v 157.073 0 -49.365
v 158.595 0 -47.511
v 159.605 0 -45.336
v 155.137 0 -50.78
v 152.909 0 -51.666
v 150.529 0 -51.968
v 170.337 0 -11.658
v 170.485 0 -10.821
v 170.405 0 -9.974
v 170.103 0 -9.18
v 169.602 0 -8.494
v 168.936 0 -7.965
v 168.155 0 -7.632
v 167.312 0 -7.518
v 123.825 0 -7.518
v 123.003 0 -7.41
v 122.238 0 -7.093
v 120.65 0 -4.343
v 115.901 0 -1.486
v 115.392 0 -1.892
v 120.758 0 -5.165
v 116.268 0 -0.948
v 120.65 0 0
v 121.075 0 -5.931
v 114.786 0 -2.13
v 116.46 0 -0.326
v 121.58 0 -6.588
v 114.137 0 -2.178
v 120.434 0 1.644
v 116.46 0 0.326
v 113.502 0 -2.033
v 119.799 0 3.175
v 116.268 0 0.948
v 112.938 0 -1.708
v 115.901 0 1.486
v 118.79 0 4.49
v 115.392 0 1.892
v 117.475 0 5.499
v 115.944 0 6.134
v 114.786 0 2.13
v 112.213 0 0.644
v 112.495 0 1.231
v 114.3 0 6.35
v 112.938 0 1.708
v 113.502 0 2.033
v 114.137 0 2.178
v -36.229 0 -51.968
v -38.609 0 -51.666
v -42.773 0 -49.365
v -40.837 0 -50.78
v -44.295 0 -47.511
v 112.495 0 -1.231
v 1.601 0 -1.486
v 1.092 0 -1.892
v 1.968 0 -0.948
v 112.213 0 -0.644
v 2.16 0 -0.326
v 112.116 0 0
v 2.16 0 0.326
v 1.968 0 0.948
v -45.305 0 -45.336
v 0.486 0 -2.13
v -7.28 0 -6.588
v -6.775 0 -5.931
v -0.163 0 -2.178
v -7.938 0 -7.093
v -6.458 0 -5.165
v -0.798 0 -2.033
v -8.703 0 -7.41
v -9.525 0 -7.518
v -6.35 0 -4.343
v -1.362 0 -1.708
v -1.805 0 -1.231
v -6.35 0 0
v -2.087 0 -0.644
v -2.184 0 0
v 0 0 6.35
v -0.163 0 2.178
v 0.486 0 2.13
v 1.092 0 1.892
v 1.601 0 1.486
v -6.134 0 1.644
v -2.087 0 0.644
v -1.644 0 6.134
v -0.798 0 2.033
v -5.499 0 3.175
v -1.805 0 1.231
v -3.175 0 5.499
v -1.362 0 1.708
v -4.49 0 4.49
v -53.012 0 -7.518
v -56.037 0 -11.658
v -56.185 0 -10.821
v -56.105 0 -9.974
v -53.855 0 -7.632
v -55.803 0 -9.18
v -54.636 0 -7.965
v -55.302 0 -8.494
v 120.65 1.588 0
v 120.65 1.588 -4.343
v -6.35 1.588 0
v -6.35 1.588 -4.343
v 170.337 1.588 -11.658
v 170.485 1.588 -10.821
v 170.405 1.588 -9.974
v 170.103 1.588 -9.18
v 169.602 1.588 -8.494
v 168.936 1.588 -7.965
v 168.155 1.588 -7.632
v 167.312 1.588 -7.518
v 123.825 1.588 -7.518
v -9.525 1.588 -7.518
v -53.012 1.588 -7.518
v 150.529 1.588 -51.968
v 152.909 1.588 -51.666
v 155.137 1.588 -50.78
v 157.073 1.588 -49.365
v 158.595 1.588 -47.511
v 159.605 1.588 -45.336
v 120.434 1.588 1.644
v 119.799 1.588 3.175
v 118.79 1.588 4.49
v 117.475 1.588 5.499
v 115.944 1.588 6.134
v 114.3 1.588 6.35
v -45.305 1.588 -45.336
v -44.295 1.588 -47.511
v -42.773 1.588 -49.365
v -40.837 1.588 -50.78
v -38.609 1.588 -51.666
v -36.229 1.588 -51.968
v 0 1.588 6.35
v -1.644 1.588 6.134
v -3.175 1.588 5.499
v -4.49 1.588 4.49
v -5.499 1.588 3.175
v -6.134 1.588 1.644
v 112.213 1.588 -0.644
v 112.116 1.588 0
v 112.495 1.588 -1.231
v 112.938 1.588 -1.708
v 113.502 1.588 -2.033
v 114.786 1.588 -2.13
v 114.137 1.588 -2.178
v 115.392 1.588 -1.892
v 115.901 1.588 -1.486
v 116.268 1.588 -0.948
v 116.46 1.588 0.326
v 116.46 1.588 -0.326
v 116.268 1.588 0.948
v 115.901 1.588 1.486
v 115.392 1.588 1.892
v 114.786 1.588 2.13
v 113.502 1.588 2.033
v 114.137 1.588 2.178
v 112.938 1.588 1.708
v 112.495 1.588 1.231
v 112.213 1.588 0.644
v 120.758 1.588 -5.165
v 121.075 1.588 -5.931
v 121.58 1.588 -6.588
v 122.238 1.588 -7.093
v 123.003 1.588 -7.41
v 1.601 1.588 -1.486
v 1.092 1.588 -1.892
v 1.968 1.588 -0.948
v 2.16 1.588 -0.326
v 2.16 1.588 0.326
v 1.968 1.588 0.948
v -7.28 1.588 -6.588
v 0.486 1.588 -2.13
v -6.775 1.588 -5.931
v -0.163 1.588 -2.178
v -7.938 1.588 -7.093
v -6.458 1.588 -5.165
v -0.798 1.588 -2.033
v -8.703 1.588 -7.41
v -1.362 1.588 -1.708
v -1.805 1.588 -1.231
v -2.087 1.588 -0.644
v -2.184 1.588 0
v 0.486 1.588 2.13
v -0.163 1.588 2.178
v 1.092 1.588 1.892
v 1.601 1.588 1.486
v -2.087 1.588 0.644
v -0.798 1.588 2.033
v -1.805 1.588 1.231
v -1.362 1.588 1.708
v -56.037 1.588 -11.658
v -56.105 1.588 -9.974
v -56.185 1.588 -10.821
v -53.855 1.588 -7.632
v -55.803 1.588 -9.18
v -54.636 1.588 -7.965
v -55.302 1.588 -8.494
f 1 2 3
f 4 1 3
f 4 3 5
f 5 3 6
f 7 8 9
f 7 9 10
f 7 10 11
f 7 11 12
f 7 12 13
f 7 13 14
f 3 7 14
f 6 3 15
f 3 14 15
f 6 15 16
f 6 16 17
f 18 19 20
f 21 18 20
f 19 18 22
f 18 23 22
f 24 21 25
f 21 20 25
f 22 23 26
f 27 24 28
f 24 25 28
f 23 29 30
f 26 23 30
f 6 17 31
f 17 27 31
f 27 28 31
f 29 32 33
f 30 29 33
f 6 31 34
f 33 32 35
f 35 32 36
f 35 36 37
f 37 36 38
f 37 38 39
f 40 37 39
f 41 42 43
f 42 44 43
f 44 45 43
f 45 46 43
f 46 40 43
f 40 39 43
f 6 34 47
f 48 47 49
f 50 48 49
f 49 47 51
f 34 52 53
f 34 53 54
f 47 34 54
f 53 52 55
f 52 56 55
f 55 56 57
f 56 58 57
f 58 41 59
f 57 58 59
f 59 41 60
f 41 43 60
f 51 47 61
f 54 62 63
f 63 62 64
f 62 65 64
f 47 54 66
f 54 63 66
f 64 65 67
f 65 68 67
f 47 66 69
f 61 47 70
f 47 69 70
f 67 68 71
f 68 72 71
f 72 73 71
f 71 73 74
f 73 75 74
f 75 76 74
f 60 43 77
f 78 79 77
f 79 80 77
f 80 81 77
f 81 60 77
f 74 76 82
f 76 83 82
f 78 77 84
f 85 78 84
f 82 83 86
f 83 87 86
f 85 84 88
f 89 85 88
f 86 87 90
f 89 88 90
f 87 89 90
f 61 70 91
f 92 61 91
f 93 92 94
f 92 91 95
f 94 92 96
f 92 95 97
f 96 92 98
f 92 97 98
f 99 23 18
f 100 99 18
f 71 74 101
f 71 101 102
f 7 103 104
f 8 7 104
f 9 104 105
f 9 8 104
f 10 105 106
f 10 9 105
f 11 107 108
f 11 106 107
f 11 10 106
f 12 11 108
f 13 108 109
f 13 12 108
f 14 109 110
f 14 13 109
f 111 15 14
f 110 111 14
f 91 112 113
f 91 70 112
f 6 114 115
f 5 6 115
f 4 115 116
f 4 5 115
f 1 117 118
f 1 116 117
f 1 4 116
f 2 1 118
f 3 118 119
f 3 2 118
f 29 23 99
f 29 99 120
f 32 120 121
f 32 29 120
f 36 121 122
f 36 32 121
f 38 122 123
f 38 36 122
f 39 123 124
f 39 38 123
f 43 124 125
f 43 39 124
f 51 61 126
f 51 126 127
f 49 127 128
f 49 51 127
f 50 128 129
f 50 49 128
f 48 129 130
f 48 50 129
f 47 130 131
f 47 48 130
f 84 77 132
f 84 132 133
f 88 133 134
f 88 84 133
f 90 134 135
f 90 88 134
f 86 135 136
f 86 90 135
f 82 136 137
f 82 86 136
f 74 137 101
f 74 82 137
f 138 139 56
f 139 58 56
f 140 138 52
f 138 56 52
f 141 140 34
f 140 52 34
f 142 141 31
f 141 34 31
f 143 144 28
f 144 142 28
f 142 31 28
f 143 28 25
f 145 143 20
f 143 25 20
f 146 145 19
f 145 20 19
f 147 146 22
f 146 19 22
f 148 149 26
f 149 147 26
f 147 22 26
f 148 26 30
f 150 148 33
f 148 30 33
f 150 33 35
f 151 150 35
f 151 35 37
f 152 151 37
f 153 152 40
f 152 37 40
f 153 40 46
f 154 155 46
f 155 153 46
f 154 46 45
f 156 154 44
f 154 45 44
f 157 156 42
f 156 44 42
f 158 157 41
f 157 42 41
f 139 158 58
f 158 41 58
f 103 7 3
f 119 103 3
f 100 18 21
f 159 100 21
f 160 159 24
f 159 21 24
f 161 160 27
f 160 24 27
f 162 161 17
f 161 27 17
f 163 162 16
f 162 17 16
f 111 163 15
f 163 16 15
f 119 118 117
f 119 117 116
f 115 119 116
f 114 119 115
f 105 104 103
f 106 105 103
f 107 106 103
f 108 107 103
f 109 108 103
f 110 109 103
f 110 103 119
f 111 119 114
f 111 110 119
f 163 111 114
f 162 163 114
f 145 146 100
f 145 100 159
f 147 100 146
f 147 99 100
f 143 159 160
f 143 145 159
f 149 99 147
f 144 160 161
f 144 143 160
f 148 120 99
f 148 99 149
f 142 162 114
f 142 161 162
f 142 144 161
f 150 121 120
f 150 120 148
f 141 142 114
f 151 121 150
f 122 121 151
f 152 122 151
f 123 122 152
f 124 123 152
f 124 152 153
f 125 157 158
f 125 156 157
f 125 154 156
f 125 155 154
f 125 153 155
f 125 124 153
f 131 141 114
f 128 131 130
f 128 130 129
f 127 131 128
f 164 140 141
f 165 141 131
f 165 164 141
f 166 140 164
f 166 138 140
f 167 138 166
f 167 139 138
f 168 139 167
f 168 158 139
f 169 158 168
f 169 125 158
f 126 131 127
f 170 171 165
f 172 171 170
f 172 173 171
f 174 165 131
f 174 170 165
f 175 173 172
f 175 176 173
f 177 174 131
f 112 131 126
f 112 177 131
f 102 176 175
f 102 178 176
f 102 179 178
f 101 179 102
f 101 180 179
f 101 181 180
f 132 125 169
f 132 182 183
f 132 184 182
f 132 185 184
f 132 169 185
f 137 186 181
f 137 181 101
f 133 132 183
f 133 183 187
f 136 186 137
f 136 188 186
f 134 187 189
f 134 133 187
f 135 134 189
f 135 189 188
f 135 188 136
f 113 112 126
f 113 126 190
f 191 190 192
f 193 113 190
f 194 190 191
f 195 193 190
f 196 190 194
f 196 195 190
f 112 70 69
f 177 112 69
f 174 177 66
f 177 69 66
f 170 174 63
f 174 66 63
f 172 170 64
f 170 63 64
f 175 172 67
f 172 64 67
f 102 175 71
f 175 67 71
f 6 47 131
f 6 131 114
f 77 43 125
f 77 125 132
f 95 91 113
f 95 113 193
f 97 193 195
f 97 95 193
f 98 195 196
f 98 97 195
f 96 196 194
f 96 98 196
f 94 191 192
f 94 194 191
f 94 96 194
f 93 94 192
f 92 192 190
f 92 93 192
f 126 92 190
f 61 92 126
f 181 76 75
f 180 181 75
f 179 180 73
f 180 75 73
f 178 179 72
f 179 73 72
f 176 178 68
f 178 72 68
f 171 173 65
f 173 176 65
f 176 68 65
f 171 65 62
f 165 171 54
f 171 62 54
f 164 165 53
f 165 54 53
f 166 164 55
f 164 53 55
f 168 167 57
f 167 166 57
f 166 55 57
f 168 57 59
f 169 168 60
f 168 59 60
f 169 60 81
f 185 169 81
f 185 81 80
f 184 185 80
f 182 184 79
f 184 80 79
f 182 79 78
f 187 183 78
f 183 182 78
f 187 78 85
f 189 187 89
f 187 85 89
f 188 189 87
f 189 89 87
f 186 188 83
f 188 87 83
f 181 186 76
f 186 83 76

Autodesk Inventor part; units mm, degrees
ref_plane "YZ Plane" through (0, 0, 0) normal (1, 0, 0) x (0, 1, 0)
ref_plane "XZ Plane" through (0, 0, 0) normal (0, 1, 0) x (-1, 0, 0)
ref_plane "XY Plane" through (0, 0, 0) normal (0, 0, 1) x (1, 0, 0)
sketch "main" plane through (0, 0, 0) normal (0, 0, 1) x (1, 0, 0)
  line L0 (-49.2738, 43.4655) -> (65.0262, 43.4655)
  circle A0 centre (65.0262, 37.1155) radius 2.1844
  line L1 (71.3762, 37.1155) -> (71.3762, 32.7721)
  arc A1 (71.3762, 37.1155) -> (65.0262, 43.4655) centre (65.0262, 37.1155) ccw
  line L2 (-71.4988, 29.5971) -> (-102.2861, 29.5971)
  line L3 (-105.3112, 25.4581) -> (-94.5785, -8.22)
  line L4 (-58.7988, 29.5971) -> (118.0384, 29.5971)
  line L5 (121.0635, 25.4581) -> (110.3309, -8.22)
  line L6 (101.2556, -14.8529) -> (-85.5032, -14.8529)
  arc A2 (-94.5785, -8.22) -> (-85.5032, -14.8529) centre (-85.5032, -5.3279) ccw
  arc A3 (101.2556, -14.8529) -> (110.3309, -8.22) centre (101.2556, -5.3279) ccw
  arc A4 (-102.2861, 29.5971) -> (-105.3112, 25.4581) centre (-102.2861, 26.4221) ccw
  arc A5 (121.0635, 25.4581) -> (118.0384, 29.5971) centre (118.0384, 26.4221) ccw
  arc A6 (71.3762, 32.7721) -> (74.5512, 29.5971) centre (74.5512, 32.7721) ccw
  line L7 (-58.7988, 29.5971) -> (-71.4988, 29.5971)
  circle A7 centre (-49.2738, 37.1155) radius 2.1844
  arc A8 (-49.2738, 43.4655) -> (-55.6238, 37.1155) centre (-49.2738, 37.1155) ccw
  line L8 (-55.6238, 37.1155) -> (-55.6238, 32.7721)
  arc A9 (-58.7988, 29.5971) -> (-55.6238, 32.7721) centre (-58.7988, 32.7721) ccw
  point P0 (1.5262, 9.2461)
  point P1 (-55.8302, 29.5971)
  point P2 (-106.6302, 29.5971)
  point P3 (-92.4647, -14.8529)
  point P4 (122.3826, 29.5971)
  point P5 (108.2171, -14.8529)
  dimension "d0" = 12.7
  dimension "d11" = 50.8
  dimension "d17" = 9.525
  dimension "d18" = 9.525
  dimension "d19" = 3.175
  dimension "d20" = 3.175
  dimension "d23" = 44.45
  dimension "d24" = 4.3688
  dimension "d25" = 186.7588
  dimension "d26" = 3.175
sketch "Sketch1" plane through (0, 0, 0) normal (0, 1, 0) x (-1, 0, 0)
  line L0 (-114.3, 6.35) -> (0, 6.35)
  circle A0 centre (0, 0) radius 2.1844
  line L1 (6.35, 0) -> (6.35, -4.3434)
  arc A1 (6.35, 0) -> (0, 6.35) centre (0, 0) ccw
  line L2 (-136.525, -7.5184) -> (-167.3123, -7.5184)
  line L3 (-170.3374, -11.6575) -> (-159.6047, -45.3356)
  line L4 (-123.825, -7.5184) -> (53.0123, -7.5184)
  line L5 (56.0374, -11.6575) -> (45.3047, -45.3356)
  line L6 (36.2294, -51.9684) -> (-150.5294, -51.9684)
  arc A2 (-159.6047, -45.3356) -> (-150.5294, -51.9684) centre (-150.5294, -42.4434) ccw
  arc A3 (36.2294, -51.9684) -> (45.3047, -45.3356) centre (36.2294, -42.4434) ccw
  arc A4 (-167.3123, -7.5184) -> (-170.3374, -11.6575) centre (-167.3123, -10.6934) ccw
  arc A5 (56.0374, -11.6575) -> (53.0123, -7.5184) centre (53.0123, -10.6934) ccw
  arc A6 (6.35, -4.3434) -> (9.525, -7.5184) centre (9.525, -4.3434) ccw
  line L7 (-123.825, -7.5184) -> (-136.525, -7.5184)
  circle A7 centre (-114.3, 0) radius 2.1844
  arc A8 (-114.3, 6.35) -> (-120.65, 0) centre (-114.3, 0) ccw
  line L8 (-120.65, 0) -> (-120.65, -4.3434)
  arc A9 (-123.825, -7.5184) -> (-120.65, -4.3434) centre (-123.825, -4.3434) ccw
extrude "Extrusion1" add sketch "Sketch1" along normal blind 1.5875
feature "Bend Part2" [suppressed]
equation "\"BendRadius\" = Thickness"
equation "\"BendReliefWidth\" = Thickness"
equation "\"BendReliefDepth\" = 0.5 * Thickness"
equation "\"CornerReliefSize\" = 4 * Thickness"
equation "\"MinimumRemnant\" = 2 * Thickness"
equation "\"TransitionRadius\" = BendRadius"
equation "\"JacobiRadiusSize\" = BendRadius"
equation "\"GapSize\" = Thickness"
equation "\"Thickness\" = 1.5875"
properties part number "intake_wedge" material "Acetal Resin, White"
